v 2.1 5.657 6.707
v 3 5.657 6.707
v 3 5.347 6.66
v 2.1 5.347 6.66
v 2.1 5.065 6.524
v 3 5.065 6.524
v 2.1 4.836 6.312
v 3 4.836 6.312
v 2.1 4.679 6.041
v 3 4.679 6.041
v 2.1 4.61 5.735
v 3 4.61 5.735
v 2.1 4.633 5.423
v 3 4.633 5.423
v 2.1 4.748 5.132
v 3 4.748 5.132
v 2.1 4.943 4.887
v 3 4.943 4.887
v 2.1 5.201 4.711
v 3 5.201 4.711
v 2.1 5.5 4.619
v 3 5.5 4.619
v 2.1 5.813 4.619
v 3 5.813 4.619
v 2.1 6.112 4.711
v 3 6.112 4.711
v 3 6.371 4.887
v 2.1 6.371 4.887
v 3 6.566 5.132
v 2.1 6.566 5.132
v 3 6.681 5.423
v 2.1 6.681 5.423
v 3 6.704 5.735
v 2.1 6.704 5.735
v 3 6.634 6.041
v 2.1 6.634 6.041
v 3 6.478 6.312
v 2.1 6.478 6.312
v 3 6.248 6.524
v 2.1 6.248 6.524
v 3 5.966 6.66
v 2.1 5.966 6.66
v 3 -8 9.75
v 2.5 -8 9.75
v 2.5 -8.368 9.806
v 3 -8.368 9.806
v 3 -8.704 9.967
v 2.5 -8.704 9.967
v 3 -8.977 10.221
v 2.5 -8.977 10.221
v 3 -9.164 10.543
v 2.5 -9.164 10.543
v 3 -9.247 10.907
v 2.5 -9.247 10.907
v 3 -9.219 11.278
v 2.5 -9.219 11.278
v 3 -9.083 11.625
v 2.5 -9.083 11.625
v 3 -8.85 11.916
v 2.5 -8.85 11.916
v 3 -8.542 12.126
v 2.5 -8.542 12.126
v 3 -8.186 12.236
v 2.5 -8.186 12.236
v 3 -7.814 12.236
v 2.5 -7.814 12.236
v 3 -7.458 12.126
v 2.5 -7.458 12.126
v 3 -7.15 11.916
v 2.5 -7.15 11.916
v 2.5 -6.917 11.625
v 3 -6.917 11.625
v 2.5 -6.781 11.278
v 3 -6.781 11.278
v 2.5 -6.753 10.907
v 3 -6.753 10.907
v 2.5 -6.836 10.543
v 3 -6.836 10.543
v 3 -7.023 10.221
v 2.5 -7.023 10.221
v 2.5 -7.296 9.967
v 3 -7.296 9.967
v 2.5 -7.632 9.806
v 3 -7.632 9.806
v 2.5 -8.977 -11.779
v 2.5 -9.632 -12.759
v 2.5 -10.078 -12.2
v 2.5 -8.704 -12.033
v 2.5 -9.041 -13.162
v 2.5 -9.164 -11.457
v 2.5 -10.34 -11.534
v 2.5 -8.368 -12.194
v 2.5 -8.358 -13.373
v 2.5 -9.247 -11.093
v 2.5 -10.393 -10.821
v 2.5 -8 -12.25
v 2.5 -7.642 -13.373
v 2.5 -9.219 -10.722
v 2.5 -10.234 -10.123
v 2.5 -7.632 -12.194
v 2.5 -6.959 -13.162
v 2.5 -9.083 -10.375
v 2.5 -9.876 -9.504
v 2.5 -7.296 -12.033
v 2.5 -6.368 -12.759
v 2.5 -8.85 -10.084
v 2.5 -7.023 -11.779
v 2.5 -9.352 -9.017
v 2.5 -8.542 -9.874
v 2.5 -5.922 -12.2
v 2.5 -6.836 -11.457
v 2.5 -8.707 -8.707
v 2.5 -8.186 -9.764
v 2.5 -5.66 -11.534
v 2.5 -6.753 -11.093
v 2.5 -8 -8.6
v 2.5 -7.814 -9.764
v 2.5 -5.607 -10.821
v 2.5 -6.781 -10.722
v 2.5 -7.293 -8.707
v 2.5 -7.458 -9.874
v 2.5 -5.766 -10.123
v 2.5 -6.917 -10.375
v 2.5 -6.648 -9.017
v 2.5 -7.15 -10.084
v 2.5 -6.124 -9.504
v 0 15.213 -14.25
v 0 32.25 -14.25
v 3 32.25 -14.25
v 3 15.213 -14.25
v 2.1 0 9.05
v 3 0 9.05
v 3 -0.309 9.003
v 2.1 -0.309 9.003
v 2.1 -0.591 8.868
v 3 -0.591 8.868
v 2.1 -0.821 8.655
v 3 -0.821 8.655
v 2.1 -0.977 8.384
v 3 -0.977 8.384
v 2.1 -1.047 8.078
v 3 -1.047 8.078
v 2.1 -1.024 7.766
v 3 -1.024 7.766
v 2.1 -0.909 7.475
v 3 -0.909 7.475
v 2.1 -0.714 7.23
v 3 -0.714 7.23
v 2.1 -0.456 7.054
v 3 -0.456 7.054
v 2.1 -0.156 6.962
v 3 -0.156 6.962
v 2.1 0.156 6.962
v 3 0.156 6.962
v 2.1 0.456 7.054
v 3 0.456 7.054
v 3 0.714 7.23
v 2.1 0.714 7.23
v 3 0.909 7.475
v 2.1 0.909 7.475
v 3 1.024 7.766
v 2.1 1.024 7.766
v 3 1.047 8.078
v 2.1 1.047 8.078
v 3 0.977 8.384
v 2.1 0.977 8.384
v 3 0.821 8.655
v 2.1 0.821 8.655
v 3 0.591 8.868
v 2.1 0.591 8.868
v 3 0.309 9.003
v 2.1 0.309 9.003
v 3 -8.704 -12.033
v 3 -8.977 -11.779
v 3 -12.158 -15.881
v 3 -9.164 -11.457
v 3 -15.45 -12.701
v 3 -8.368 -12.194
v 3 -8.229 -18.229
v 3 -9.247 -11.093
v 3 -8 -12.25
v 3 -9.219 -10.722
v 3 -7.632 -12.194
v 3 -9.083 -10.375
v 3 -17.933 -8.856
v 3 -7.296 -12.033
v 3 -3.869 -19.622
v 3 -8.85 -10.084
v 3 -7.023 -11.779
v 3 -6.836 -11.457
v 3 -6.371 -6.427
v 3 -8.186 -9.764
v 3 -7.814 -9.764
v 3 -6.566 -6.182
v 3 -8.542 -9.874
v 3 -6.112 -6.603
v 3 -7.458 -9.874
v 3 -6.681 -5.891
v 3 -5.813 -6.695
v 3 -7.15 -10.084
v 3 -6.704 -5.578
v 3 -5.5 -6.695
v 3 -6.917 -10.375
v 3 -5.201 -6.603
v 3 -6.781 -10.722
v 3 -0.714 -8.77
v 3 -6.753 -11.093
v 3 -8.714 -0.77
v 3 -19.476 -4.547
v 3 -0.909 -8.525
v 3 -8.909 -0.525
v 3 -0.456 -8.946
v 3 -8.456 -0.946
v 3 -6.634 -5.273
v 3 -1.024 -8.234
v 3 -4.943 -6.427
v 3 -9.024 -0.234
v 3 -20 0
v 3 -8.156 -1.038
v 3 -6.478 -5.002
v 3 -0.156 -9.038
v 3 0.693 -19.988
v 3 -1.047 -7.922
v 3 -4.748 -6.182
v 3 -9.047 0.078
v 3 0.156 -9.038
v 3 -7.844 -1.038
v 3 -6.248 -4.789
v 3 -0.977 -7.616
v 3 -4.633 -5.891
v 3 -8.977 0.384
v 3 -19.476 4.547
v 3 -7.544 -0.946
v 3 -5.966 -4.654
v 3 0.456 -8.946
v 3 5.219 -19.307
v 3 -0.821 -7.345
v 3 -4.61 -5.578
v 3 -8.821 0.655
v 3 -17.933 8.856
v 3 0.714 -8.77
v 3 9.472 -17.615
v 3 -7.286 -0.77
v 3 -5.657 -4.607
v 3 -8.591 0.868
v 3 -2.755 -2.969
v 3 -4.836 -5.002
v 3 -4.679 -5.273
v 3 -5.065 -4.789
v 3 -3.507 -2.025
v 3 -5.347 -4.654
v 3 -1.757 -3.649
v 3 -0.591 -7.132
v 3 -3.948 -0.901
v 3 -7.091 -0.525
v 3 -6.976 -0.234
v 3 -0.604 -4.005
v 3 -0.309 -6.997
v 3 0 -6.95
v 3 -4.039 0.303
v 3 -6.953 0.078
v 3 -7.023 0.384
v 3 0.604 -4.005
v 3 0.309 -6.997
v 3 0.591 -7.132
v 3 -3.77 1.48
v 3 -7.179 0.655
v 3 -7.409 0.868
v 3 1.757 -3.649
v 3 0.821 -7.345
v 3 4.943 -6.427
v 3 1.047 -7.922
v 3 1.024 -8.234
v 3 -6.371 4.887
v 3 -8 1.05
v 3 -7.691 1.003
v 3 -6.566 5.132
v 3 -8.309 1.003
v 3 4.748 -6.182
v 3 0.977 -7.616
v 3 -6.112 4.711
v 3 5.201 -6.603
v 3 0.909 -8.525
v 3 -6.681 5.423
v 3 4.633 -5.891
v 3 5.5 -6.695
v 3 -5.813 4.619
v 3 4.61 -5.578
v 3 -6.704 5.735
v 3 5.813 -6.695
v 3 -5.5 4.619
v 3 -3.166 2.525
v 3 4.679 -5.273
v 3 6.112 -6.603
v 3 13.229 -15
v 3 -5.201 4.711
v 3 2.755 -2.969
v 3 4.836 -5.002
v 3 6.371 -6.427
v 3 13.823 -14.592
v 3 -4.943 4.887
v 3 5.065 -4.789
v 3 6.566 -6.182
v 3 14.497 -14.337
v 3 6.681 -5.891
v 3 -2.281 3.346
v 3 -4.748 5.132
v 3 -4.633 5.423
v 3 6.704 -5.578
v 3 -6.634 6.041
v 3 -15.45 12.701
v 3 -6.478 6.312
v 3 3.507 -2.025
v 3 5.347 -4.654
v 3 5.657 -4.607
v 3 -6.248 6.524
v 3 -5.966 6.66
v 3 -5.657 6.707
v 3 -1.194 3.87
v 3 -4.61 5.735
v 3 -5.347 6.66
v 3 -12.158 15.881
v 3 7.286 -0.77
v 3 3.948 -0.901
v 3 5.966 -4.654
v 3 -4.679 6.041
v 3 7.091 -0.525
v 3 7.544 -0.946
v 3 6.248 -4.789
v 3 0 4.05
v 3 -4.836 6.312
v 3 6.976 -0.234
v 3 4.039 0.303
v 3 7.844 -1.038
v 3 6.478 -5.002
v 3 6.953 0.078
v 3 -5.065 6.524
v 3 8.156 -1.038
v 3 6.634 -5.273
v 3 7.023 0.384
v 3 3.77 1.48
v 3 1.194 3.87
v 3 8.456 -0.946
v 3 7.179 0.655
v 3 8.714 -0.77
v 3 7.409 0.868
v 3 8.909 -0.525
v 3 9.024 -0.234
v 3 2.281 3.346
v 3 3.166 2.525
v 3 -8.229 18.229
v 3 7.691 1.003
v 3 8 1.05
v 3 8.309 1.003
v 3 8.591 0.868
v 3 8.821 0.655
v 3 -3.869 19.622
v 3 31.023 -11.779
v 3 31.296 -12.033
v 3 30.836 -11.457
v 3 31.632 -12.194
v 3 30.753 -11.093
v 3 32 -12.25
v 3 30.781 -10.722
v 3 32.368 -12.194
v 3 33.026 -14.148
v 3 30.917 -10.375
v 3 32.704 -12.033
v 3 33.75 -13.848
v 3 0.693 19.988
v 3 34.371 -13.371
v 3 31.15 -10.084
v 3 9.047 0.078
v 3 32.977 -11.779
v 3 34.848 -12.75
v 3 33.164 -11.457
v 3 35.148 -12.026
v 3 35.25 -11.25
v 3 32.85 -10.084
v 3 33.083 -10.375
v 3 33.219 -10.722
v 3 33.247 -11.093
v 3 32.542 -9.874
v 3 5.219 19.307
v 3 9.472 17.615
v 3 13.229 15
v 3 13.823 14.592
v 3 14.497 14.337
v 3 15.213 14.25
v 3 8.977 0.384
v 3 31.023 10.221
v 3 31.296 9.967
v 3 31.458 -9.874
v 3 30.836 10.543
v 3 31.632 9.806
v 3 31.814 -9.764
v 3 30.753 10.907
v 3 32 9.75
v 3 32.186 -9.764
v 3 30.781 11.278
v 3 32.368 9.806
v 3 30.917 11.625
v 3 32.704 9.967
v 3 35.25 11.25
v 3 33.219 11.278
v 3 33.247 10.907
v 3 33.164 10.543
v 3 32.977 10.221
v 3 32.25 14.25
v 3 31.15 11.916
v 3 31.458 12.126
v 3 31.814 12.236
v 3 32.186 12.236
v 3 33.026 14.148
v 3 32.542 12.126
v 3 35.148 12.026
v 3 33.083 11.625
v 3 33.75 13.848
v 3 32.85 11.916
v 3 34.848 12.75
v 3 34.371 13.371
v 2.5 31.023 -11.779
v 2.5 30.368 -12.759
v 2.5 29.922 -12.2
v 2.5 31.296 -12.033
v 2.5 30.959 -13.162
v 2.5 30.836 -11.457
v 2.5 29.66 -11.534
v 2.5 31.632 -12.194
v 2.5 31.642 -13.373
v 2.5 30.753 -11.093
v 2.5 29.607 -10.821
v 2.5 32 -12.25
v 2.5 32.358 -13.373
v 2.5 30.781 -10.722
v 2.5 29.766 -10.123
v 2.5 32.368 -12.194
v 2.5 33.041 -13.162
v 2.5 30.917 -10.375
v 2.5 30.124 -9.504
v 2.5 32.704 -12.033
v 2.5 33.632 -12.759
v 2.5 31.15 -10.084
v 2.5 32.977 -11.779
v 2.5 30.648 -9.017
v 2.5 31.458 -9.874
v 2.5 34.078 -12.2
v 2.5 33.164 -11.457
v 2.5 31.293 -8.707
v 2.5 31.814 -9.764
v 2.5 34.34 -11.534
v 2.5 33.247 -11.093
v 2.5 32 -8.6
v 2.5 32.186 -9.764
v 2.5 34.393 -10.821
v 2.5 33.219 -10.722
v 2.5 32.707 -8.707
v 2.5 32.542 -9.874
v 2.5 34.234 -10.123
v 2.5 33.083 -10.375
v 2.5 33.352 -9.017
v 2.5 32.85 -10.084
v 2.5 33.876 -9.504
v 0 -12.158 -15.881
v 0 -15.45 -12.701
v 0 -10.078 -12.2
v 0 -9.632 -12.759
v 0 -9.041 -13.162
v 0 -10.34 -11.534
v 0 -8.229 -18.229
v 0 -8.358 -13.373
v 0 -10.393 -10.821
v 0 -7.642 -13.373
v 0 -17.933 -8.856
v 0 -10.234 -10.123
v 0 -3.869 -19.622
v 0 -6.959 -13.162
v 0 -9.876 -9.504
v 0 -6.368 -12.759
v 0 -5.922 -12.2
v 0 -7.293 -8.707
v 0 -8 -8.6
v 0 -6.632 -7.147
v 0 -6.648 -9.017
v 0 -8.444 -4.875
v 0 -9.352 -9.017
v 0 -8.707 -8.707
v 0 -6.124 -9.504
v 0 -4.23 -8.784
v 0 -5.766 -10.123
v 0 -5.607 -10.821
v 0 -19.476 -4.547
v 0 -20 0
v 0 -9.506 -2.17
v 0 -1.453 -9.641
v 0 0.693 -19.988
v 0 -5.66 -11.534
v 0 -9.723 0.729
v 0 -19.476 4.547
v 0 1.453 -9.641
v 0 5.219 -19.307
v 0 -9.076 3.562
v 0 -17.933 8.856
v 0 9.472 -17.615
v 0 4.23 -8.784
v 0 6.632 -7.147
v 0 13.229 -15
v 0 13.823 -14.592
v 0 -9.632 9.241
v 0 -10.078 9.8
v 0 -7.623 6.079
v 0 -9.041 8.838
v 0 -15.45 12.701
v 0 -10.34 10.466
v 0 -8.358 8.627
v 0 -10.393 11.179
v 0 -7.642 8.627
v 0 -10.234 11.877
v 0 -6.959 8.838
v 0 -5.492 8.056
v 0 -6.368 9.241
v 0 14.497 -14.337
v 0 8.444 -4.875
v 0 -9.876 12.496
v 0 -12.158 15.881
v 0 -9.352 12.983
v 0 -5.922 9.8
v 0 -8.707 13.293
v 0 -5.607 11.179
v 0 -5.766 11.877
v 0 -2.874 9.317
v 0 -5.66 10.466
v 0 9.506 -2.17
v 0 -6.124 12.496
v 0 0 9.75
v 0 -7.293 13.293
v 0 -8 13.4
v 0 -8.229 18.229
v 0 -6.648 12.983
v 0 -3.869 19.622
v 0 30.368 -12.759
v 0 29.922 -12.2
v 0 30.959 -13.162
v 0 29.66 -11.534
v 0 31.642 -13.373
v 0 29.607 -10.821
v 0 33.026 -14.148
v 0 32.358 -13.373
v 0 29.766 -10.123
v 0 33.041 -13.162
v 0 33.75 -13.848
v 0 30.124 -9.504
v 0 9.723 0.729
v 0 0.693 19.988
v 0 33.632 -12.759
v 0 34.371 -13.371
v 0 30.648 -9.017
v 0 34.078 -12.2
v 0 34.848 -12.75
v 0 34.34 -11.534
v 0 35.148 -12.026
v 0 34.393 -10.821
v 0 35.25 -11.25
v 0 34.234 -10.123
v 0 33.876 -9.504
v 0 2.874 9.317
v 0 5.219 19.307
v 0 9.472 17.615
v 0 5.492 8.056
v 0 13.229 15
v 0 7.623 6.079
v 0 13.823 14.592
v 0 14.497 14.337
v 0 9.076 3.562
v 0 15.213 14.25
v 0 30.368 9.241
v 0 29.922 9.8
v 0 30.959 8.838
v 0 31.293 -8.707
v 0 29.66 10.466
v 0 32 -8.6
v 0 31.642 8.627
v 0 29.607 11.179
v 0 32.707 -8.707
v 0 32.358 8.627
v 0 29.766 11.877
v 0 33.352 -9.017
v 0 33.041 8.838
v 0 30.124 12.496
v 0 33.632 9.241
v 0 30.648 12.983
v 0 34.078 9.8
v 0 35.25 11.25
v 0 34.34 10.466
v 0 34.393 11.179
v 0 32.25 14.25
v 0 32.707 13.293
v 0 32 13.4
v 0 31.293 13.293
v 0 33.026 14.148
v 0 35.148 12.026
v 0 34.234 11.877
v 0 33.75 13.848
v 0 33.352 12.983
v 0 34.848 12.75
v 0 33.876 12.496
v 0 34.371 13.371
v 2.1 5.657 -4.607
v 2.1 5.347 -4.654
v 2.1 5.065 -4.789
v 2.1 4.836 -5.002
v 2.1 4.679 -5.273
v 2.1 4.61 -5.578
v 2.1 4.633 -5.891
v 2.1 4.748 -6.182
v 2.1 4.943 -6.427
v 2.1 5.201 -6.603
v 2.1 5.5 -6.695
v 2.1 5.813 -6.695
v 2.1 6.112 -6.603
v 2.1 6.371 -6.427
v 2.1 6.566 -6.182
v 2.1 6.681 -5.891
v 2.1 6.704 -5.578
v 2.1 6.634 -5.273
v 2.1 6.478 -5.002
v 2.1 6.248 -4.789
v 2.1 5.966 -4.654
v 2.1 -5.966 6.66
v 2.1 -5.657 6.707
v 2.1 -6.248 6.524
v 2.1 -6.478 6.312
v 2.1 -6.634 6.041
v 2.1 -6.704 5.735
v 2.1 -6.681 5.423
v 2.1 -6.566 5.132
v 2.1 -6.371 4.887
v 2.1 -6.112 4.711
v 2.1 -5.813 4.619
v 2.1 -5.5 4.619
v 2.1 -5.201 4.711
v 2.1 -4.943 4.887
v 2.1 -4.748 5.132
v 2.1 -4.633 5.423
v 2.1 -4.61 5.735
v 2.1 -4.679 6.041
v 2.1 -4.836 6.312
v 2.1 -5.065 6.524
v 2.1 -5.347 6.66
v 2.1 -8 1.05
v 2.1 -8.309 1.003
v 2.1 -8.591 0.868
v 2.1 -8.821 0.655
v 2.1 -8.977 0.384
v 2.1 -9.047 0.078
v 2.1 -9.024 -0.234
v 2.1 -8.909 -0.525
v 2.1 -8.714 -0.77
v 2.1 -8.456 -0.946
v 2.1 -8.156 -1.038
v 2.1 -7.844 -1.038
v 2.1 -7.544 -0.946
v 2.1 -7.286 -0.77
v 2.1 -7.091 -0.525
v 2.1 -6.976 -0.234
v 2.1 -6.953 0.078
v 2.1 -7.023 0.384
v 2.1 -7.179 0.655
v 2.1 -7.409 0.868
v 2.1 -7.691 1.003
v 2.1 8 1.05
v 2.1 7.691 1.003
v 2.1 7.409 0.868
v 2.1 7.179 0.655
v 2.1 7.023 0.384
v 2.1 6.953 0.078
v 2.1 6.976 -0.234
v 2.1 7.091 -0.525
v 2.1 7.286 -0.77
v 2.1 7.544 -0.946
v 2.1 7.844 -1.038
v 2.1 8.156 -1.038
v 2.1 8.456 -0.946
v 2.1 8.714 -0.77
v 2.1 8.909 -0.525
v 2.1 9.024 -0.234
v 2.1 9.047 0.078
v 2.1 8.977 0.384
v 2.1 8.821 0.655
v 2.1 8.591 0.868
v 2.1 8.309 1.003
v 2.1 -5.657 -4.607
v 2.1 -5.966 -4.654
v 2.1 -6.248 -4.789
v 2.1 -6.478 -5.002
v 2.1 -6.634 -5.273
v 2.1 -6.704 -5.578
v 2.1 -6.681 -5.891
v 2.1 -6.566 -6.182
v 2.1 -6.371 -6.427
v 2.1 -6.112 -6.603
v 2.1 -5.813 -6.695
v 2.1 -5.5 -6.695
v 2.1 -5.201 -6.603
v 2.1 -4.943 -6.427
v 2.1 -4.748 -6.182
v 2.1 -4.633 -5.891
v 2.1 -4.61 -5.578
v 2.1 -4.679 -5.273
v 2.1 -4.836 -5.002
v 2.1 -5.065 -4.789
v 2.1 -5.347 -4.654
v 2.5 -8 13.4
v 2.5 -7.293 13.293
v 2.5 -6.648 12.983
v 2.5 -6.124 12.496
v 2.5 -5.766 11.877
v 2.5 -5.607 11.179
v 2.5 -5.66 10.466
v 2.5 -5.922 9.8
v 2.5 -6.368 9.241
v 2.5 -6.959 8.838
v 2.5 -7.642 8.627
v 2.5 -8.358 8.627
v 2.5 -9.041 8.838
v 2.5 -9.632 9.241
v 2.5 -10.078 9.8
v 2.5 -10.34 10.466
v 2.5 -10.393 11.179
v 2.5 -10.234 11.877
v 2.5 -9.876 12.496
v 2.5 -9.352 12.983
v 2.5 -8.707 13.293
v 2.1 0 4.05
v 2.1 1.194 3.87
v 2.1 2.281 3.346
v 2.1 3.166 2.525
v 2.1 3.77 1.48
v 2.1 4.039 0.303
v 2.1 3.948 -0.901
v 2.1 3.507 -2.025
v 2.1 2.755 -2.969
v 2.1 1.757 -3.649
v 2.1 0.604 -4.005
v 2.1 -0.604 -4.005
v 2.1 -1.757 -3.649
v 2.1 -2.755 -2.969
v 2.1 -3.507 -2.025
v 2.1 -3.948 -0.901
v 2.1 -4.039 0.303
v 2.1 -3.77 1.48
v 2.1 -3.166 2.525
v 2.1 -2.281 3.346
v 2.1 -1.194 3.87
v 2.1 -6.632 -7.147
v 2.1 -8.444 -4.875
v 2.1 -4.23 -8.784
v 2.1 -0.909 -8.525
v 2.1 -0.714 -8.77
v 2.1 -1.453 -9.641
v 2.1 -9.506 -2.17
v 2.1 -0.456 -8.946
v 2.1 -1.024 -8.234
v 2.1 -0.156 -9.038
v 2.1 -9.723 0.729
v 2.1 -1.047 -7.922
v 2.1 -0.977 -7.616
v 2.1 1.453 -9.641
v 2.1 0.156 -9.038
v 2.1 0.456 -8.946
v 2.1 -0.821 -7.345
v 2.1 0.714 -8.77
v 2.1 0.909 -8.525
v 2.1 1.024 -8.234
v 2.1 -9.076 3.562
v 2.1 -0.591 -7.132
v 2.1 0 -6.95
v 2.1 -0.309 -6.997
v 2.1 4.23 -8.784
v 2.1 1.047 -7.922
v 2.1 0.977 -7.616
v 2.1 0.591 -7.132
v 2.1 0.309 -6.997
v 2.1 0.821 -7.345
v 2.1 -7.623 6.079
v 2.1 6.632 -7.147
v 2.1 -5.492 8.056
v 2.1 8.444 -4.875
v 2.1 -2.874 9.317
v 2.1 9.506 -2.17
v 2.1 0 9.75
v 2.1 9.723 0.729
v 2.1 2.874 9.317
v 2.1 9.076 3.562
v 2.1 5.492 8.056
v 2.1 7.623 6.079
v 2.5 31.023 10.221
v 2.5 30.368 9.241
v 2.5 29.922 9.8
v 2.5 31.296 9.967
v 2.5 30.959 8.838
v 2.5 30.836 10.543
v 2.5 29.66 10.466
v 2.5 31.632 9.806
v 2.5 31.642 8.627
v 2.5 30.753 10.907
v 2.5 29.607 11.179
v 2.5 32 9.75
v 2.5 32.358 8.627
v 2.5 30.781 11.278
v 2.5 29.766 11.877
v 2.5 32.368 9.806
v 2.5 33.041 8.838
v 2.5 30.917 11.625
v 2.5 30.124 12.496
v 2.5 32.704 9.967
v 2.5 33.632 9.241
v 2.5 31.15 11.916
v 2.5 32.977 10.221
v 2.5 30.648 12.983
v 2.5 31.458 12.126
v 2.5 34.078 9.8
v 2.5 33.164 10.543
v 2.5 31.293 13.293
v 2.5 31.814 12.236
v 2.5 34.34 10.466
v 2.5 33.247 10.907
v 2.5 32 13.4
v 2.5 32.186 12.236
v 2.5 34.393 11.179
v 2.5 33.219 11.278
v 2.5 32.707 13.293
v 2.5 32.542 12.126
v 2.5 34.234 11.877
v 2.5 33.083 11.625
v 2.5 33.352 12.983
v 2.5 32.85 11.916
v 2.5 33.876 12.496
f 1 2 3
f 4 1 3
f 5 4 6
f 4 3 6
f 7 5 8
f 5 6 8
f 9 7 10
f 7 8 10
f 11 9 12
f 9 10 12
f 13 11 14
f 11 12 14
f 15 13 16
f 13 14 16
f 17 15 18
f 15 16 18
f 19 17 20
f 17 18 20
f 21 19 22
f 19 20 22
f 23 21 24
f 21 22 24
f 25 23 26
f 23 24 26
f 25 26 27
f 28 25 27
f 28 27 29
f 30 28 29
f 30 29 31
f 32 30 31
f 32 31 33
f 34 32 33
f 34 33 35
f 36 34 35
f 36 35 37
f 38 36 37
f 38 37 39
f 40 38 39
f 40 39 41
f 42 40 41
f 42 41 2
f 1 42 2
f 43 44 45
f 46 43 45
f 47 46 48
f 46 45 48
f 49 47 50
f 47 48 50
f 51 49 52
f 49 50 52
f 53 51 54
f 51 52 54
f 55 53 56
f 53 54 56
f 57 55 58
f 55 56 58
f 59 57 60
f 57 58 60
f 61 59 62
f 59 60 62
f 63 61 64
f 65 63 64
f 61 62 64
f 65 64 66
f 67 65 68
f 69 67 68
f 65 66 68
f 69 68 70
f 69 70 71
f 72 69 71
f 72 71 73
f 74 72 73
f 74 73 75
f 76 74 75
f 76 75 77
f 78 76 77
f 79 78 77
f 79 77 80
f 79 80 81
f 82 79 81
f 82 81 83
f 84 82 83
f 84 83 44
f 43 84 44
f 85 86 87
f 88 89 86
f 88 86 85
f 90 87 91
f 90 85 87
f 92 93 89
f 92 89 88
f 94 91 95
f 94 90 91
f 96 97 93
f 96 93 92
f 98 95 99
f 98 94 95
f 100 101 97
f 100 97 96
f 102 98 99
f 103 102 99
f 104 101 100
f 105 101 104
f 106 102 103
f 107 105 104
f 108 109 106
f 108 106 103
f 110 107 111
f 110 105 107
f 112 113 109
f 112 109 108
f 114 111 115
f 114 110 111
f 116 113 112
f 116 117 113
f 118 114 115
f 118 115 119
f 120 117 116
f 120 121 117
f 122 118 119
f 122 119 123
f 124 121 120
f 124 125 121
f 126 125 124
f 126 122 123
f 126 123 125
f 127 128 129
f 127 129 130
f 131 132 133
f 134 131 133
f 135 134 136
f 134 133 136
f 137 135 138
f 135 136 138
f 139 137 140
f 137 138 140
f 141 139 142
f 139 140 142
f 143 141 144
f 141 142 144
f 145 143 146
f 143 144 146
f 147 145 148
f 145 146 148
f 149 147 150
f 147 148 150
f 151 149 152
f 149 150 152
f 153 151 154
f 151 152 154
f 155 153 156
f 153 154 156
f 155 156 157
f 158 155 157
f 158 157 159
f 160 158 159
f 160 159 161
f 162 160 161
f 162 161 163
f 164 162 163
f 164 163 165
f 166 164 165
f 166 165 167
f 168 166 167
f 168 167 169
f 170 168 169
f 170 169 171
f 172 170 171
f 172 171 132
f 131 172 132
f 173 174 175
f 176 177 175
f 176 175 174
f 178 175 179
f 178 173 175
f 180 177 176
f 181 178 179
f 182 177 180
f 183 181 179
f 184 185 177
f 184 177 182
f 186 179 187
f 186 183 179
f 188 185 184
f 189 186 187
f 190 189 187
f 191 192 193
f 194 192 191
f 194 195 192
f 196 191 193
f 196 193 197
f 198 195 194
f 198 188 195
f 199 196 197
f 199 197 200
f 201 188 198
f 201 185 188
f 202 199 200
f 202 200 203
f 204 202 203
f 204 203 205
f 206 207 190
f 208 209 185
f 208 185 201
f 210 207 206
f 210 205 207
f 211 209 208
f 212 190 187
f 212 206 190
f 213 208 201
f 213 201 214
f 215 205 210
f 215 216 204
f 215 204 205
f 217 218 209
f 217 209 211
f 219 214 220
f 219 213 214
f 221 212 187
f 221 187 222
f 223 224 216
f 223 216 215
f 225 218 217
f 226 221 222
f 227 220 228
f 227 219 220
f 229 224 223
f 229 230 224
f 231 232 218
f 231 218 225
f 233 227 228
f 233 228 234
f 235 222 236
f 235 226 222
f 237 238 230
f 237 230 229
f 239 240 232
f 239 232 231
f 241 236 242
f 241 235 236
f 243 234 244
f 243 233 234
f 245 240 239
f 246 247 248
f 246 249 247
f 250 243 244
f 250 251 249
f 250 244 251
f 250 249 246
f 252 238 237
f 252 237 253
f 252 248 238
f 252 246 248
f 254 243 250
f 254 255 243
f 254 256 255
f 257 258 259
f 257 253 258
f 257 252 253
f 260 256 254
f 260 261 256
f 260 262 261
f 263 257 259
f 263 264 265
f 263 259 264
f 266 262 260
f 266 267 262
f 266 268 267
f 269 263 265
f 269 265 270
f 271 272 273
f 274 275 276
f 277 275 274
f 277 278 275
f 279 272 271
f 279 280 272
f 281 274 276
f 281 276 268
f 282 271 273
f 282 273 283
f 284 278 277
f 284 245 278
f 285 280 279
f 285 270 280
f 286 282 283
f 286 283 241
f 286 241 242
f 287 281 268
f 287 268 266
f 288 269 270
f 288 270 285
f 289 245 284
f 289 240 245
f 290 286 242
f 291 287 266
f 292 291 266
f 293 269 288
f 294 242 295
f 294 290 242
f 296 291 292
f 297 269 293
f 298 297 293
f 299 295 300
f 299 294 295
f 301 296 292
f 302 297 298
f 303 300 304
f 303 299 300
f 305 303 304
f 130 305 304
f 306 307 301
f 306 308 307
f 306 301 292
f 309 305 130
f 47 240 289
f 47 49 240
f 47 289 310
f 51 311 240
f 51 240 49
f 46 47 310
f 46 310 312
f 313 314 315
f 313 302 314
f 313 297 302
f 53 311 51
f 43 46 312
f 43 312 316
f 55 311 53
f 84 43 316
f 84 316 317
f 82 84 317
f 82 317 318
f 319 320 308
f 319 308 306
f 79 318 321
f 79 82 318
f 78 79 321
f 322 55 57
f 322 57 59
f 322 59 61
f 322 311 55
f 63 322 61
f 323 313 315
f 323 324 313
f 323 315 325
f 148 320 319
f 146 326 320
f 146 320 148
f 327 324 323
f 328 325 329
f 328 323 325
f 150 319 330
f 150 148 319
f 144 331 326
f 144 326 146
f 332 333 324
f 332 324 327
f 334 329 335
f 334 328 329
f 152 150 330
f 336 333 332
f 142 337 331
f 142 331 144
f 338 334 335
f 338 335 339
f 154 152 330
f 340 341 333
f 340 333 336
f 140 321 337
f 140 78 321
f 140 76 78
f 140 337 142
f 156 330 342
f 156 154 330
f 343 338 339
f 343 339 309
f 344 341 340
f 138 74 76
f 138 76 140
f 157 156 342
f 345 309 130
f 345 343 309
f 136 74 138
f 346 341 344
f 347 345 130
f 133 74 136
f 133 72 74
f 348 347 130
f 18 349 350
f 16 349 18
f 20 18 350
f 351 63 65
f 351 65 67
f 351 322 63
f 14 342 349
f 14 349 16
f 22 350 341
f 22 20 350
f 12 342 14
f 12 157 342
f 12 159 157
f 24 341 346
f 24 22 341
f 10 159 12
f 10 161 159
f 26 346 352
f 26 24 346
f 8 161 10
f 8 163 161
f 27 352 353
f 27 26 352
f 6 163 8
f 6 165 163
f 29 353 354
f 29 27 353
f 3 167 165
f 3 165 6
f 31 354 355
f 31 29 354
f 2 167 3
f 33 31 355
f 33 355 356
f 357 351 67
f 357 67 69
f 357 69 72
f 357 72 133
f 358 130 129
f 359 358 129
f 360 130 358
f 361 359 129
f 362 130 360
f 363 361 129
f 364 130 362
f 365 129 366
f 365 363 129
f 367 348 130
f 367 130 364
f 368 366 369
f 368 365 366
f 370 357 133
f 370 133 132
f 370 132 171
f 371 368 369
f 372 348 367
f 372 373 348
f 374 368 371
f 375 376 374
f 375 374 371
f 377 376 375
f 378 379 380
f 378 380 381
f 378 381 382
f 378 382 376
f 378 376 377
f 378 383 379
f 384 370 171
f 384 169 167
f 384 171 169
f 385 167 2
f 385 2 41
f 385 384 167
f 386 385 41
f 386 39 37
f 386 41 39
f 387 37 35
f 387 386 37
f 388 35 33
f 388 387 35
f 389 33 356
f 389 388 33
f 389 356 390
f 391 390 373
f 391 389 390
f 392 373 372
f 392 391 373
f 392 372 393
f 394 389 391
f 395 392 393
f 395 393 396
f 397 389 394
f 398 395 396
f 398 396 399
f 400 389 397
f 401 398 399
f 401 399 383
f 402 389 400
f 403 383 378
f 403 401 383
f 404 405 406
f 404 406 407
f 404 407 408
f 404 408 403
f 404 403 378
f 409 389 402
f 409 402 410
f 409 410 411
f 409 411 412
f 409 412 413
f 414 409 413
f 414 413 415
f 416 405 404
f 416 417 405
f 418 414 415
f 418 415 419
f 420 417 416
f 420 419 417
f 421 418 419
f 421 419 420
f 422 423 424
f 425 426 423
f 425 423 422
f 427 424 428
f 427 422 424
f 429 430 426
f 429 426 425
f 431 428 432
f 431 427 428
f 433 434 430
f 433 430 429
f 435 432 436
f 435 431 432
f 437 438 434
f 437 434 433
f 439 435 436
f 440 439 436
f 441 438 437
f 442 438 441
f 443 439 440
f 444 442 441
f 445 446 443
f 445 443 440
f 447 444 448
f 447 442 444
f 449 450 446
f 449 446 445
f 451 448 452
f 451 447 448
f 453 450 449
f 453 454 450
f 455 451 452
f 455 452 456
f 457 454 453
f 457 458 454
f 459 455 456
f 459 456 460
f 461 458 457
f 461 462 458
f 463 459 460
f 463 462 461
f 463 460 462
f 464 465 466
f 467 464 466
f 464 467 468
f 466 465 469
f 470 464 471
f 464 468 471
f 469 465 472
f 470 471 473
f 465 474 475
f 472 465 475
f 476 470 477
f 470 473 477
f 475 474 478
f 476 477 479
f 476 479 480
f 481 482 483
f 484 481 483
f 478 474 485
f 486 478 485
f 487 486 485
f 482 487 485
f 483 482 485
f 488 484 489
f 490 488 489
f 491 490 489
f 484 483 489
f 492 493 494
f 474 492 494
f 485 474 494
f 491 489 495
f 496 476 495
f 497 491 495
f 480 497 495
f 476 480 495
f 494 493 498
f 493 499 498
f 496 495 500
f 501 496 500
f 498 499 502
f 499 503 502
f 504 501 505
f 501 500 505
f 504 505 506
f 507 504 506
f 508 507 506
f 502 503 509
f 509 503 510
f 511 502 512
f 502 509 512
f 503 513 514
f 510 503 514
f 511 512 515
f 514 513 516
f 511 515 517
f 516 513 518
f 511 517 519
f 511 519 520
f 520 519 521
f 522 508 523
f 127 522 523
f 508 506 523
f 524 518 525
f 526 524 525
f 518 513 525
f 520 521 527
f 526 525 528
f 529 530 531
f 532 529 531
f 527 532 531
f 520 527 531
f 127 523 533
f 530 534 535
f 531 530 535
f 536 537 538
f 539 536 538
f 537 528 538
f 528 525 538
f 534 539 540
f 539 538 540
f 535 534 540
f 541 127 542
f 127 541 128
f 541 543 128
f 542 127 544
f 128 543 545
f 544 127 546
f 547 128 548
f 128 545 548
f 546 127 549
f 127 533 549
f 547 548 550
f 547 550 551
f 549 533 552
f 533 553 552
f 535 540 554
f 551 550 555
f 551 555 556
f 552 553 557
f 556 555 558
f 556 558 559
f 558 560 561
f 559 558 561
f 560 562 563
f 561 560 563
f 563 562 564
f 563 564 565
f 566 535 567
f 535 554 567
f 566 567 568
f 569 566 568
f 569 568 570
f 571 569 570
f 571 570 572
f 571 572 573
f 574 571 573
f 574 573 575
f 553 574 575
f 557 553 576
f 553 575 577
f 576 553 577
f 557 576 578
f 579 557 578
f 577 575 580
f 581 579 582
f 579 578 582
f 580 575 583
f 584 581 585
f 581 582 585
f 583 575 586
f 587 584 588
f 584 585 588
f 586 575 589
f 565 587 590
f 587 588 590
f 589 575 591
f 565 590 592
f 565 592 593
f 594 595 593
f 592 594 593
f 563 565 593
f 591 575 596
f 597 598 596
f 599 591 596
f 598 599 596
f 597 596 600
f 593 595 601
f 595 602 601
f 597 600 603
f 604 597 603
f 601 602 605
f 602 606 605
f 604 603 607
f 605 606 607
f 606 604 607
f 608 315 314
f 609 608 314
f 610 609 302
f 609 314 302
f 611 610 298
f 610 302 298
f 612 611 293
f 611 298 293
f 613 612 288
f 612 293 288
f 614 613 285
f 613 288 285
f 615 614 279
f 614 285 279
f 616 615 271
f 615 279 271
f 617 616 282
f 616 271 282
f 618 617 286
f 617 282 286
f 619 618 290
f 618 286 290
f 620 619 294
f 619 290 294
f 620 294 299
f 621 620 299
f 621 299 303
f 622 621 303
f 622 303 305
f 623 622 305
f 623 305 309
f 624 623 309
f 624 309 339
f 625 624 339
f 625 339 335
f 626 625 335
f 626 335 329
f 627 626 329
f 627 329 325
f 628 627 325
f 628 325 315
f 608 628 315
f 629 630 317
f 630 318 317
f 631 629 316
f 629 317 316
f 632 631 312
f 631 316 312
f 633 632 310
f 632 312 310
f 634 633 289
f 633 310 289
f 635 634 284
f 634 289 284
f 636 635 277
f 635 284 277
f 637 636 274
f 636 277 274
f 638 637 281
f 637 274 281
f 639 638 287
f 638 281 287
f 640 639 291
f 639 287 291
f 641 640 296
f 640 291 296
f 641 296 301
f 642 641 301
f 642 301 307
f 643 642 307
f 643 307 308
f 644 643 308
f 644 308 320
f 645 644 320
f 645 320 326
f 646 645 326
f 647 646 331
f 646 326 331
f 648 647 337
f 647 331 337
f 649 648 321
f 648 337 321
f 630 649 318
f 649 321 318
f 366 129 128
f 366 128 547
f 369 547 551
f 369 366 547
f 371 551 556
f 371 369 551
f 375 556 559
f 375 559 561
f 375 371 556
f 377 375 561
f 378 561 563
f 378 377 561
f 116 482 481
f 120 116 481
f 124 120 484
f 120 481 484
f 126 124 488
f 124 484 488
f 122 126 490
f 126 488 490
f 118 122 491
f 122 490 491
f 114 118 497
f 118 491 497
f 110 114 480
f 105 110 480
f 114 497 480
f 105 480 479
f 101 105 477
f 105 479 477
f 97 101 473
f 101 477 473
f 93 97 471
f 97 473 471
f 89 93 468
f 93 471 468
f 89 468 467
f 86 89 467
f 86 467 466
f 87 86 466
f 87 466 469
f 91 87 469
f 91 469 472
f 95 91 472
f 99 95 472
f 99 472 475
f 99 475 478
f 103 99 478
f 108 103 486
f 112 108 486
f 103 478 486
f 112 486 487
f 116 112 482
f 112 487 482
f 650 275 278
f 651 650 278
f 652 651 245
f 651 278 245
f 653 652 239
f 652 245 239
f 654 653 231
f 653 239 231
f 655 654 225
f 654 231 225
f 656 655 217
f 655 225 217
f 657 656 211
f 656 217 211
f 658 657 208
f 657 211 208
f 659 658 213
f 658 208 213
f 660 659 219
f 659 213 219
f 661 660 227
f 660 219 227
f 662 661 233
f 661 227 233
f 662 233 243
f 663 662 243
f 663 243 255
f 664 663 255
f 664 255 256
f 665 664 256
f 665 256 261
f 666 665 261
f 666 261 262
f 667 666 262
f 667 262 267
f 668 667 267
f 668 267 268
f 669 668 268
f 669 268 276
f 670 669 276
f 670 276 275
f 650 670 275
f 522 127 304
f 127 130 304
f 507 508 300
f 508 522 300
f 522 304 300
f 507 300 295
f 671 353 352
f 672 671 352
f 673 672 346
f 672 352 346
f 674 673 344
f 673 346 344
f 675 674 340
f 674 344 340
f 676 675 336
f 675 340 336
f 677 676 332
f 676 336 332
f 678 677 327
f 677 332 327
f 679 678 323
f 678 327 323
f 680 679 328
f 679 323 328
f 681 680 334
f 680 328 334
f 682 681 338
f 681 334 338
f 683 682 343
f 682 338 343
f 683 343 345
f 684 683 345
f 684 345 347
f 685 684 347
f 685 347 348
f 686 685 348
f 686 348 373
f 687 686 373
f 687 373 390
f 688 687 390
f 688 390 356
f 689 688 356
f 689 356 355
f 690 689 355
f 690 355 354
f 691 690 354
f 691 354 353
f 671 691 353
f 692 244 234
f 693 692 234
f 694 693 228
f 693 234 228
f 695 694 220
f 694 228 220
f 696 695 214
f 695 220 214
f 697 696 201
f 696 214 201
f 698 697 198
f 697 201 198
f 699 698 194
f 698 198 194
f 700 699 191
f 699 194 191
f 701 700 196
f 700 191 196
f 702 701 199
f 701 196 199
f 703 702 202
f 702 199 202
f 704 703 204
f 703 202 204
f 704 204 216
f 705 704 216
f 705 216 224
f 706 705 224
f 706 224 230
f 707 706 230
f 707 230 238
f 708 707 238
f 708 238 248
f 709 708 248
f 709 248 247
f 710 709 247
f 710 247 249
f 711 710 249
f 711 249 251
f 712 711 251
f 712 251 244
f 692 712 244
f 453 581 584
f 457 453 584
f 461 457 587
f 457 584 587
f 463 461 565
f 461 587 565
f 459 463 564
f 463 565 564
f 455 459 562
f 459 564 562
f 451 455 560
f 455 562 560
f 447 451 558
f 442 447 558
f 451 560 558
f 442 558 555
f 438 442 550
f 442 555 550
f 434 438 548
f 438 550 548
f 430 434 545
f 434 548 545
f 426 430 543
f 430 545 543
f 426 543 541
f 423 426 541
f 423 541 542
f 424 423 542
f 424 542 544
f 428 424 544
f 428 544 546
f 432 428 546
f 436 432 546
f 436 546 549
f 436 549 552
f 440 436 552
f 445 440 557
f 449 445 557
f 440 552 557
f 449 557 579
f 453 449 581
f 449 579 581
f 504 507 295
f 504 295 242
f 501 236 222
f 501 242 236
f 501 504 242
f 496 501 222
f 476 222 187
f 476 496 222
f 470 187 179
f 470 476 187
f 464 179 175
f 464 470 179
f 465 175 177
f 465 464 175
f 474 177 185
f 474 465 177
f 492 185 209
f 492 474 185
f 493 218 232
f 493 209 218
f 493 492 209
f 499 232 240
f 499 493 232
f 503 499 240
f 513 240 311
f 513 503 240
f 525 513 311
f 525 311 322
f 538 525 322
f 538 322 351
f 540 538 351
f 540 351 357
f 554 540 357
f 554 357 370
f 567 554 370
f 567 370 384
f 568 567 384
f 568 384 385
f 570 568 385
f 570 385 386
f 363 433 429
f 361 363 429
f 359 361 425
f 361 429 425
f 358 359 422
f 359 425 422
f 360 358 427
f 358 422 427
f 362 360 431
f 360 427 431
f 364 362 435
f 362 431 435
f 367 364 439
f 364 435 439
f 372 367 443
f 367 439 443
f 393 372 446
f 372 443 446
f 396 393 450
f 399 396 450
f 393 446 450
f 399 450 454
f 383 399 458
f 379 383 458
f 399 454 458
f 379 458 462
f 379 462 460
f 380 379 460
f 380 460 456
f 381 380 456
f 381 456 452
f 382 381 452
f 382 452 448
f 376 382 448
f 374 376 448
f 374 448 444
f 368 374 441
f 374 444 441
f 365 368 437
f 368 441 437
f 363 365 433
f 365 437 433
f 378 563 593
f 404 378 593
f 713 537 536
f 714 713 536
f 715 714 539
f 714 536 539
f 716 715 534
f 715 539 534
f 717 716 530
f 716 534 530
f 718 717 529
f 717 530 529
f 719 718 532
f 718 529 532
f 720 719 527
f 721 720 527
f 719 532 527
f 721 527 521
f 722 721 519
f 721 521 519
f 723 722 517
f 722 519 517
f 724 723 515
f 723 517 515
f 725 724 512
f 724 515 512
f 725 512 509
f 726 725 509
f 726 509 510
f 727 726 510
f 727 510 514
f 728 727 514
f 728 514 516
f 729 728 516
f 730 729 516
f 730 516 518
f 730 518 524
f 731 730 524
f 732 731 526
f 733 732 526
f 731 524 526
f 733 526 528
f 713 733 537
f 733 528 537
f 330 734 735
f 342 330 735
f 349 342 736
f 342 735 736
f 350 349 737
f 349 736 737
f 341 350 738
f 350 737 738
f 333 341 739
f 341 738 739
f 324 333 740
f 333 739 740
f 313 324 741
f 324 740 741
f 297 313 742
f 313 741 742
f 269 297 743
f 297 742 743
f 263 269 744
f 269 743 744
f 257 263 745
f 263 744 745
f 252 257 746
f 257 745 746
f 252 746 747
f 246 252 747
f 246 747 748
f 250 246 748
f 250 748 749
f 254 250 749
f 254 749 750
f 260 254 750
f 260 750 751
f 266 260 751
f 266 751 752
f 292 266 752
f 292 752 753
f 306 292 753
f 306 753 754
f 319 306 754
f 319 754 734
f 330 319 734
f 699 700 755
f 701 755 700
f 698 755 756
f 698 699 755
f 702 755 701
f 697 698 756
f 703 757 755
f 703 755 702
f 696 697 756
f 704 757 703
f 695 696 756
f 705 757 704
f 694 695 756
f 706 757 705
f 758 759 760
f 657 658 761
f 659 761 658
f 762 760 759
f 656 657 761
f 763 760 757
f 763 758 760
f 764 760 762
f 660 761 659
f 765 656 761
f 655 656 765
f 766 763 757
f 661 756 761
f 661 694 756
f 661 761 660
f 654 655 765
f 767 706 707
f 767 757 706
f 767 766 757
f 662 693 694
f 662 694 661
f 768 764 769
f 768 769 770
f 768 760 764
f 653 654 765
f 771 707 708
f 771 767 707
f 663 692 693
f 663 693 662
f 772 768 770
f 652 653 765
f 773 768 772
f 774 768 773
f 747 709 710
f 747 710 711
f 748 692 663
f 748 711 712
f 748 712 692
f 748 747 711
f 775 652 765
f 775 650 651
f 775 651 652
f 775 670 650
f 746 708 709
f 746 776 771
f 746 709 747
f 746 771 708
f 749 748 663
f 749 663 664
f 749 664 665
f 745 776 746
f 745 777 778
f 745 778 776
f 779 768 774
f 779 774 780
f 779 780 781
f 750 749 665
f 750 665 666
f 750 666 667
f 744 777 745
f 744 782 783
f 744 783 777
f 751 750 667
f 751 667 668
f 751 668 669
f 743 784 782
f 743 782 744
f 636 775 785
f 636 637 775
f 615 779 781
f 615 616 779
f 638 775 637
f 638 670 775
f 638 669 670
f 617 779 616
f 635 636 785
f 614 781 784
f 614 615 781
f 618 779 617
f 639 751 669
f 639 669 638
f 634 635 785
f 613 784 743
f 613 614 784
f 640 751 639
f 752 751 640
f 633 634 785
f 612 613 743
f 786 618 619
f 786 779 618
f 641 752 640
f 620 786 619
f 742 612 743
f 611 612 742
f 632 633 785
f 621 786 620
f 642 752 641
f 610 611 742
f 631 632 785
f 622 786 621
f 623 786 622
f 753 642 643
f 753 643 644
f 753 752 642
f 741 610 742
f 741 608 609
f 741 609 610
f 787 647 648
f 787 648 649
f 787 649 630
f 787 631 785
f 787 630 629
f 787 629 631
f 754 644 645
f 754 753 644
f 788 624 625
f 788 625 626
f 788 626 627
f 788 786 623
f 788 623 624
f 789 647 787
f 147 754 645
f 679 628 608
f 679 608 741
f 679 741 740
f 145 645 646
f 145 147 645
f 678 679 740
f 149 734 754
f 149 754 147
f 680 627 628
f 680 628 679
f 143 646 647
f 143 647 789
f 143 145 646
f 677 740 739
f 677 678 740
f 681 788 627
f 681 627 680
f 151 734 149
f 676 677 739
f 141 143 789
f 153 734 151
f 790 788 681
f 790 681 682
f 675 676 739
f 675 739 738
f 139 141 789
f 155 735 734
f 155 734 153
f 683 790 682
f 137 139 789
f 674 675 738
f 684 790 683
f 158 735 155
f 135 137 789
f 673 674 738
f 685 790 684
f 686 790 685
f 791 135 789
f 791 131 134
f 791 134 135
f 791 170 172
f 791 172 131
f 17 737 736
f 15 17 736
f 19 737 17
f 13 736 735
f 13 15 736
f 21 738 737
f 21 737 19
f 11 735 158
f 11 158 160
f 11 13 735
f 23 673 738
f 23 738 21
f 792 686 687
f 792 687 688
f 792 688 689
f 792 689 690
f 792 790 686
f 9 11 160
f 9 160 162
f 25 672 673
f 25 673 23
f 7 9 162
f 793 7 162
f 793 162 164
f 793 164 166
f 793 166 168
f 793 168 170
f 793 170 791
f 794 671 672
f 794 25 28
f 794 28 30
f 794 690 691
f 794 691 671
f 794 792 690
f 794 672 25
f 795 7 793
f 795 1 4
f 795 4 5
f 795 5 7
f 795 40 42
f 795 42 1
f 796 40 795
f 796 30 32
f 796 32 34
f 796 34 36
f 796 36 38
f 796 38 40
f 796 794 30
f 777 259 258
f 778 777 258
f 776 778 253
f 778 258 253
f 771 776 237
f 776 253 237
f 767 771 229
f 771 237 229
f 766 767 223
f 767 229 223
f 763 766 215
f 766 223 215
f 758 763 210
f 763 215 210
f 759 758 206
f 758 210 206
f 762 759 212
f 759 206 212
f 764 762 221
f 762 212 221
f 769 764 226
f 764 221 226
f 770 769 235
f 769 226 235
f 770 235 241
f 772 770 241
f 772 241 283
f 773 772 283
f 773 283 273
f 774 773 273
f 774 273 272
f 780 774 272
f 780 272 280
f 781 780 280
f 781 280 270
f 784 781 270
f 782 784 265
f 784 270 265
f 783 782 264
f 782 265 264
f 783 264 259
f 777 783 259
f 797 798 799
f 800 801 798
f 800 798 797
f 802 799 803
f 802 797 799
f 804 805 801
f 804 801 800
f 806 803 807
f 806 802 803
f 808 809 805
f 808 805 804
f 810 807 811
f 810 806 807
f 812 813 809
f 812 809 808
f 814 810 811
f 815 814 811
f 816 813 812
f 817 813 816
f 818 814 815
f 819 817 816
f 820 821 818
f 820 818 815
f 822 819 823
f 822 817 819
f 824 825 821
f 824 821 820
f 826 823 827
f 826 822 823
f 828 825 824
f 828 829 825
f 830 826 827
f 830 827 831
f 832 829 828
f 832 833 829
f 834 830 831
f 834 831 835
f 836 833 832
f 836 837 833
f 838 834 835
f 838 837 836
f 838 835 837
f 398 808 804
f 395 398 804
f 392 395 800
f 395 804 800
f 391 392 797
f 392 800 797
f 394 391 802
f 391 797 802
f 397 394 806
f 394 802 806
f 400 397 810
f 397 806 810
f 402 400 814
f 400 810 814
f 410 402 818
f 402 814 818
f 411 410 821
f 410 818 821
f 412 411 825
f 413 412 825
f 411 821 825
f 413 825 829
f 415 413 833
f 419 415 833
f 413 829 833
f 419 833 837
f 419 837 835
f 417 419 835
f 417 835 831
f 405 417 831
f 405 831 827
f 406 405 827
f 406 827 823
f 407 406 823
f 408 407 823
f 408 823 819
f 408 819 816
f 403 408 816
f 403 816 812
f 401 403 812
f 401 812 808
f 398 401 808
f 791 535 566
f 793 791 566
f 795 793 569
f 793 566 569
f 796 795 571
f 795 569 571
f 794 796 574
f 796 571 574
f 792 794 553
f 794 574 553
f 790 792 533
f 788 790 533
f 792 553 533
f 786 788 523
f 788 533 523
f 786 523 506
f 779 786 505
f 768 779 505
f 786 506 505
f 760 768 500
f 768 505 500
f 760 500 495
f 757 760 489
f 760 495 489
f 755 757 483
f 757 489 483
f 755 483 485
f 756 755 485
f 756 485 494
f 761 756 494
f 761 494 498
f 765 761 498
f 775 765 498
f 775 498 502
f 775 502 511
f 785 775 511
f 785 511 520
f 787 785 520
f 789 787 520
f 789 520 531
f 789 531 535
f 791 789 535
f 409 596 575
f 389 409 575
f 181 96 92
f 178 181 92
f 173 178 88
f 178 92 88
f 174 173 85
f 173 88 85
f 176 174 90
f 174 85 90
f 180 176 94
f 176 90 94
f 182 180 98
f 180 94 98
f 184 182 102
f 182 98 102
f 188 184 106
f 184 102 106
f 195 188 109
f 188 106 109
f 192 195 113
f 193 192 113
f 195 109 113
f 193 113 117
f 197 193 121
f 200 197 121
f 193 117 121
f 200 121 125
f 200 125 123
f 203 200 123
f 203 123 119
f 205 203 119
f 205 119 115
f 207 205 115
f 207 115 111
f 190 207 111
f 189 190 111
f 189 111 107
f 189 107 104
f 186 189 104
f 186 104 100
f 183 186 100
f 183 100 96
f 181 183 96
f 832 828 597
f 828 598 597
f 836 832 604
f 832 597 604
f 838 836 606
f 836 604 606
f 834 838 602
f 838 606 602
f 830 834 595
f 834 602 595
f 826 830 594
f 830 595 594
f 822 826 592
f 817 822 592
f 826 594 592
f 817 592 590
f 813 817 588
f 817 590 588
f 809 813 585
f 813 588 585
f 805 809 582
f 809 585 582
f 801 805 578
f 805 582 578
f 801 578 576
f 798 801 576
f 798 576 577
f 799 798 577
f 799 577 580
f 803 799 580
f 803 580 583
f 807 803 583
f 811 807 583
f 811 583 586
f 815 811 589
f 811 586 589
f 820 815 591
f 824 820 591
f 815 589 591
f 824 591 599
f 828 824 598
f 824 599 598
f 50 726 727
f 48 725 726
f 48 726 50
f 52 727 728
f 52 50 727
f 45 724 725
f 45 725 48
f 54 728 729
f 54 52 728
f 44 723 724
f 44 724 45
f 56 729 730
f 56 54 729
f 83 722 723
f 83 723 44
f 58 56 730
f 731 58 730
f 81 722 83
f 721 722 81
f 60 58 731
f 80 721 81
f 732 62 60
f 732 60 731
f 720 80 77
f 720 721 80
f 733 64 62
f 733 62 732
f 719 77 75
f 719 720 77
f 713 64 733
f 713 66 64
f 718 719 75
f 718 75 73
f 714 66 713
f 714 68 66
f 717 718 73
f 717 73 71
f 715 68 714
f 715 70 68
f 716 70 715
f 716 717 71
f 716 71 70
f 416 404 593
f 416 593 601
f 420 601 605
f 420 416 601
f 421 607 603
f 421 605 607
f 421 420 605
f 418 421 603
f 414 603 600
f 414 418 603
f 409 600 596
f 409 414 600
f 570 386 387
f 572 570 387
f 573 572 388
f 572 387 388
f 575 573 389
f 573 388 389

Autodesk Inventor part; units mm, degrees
ref_plane "YZ Plane" through (0, 0, 0) normal (1, 0, 0) x (0, 1, 0)
ref_plane "XZ Plane" through (0, 0, 0) normal (0, 1, 0) x (-1, 0, 0)
ref_plane "XY Plane" through (0, 0, 0) normal (0, 0, 1) x (1, 0, 0)
sketch "スケッチ1" plane through (0, 0, 0) normal (1, 0, 0) x (0, 1, 0)
  circle A0 centre (0, 0) radius 20
  circle A1 centre (0, 0) radius 9.75
  line L0 (0, 0) -> (35.25, 0)
  line L1 (35.25, 0) -> (35.25, -14.25)
  line L2 (35.25, -14.25) -> (0, -14.25)
  line L3 (0, -14.25) -> (0, 0)
  line L4 (35.25, 0) -> (35.25, 14.25)
  line L5 (35.25, 14.25) -> (0, 14.25)
  point P0 (14.0334, 14.25)
  point P1 (14.0334, -14.25)
  dimension "d0" = 40
  dimension "d1" = 19.5
  dimension "d2" = 14.25
  dimension "d3" = 35.25
extrude "押し出し1" add sketch "スケッチ1" along normal blind 3
sketch "スケッチ2" plane through (0, 0, 0) normal (-1, 0, 0) x (0, 0, 1)
  arc A0 (-14.25, 14.0334) -> (14.25, 14.0334) centre (0, 0) ccw projected
  circle A1 centre (0, 0) radius 9.75
  dimension "d6" = 19.5
extrude "押し出し2" cut sketch "スケッチ2" against normal blind 2.1
sketch "スケッチ3" plane through (2.1, 0, 0) normal (-1, 0, 0) x (0, 0, 1)
  circle A0 centre (0, 0) radius 8
  point P0 (0, 8)
  point P1 (-5.6569, 5.6569)
  point P2 (-8, 0)
  point P3 (-5.6569, -5.6569)
  point P4 (0, -8)
  point P5 (5.6569, -5.6569)
  point P6 (8, 0)
  point P7 (5.6569, 5.6569)
  dimension "d9" = 16
  dimension "d12" = 360
hole "穴1" at (2.1, 8, 0) at (2.1, 5.6569, -5.6569) at (2.1, 0, -8) at (2.1, -5.6569, -5.6569) at (2.1, -8, 0) at (2.1, -5.6569, 5.6569) at (2.1, 0, 8) at (2.1, 5.6569, 5.6569) direction (1, 0, 0) diameter 2.1 end through all
sketch "スケッチ4" plane through (3, 0, 0) normal (1, 0, 0) x (0, 0, -1)
  line L0 (-14.25, 35.25) -> (-14.25, 14.0334) projected
  line L1 (-14.25, 35.25) -> (14.25, 35.25)
  line L2 (14.25, 35.25) -> (14.25, -11.25)
  line L3 (14.25, -11.25) -> (-14.25, -11.25)
  line L4 (-14.25, -11.25) -> (-14.25, 35.25)
  point P0 (0, 0)
  point P1 (-11, -8)
  point P2 (11, -8)
  point P3 (-11, 32)
  point P4 (11, 32)
  dimension "d21" = 46.5
  dimension "d22" = 3.25
  dimension "d23" = 3.25
  dimension "d24" = 3.25
  dimension "d25" = 3.25
  dimension "d26" = 3.25
  dimension "d27" = 3.25
  dimension "d28" = 3.25
  dimension "d29" = 3.25
hole "穴2" at (3, -8, 11) at (3, -8, -11) at (3, 32, -11) at (3, 32, 11) direction (-1, 0, 0) diameter 2.5 end through all
sketch "スケッチ5" plane through (0, 0, 0) normal (-1, 0, 0) x (0, 0, 1)
  circle A0 centre (-11, -8) radius 1.25 projected
  circle A1 centre (-11, -8) radius 2.4
  circle A2 centre (11, -8) radius 1.25 projected
  circle A3 centre (11, -8) radius 2.4
  circle A4 centre (-11, 32) radius 1.25 projected
  circle A5 centre (-11, 32) radius 2.4
  circle A6 centre (11, 32) radius 1.25 projected
  circle A7 centre (11, 32) radius 2.4
  point P0 (0, 0)
  dimension "d37" = 4.8
  dimension "d38" = 4.8
  dimension "d39" = 4.8
  dimension "d40" = 4.8
extrude "押し出し3" cut sketch "スケッチ5" against normal blind 2.5 contours A1 | A2 | A3 | A4 | A5 | A6 | A7
fillet "フィレット1" radius 3 4 edges at (1.5, 35.25, -14.25) (1.5, 35.25, 14.25) (1.5, 14.0334, -14.25) (1.5, 14.0334, 14.25)
sketch "スケッチ6" plane through (2.1, 0, 0) normal (-1, 0, 0) x (0, 0, 1)
  circle A0 centre (0, 0) radius 4.05
  dimension "d44" = 8.1
extrude "押し出し4" cut sketch "スケッチ6" against normal blind 10
properties part number "connectplate3" material "アルミニウム 6061"
